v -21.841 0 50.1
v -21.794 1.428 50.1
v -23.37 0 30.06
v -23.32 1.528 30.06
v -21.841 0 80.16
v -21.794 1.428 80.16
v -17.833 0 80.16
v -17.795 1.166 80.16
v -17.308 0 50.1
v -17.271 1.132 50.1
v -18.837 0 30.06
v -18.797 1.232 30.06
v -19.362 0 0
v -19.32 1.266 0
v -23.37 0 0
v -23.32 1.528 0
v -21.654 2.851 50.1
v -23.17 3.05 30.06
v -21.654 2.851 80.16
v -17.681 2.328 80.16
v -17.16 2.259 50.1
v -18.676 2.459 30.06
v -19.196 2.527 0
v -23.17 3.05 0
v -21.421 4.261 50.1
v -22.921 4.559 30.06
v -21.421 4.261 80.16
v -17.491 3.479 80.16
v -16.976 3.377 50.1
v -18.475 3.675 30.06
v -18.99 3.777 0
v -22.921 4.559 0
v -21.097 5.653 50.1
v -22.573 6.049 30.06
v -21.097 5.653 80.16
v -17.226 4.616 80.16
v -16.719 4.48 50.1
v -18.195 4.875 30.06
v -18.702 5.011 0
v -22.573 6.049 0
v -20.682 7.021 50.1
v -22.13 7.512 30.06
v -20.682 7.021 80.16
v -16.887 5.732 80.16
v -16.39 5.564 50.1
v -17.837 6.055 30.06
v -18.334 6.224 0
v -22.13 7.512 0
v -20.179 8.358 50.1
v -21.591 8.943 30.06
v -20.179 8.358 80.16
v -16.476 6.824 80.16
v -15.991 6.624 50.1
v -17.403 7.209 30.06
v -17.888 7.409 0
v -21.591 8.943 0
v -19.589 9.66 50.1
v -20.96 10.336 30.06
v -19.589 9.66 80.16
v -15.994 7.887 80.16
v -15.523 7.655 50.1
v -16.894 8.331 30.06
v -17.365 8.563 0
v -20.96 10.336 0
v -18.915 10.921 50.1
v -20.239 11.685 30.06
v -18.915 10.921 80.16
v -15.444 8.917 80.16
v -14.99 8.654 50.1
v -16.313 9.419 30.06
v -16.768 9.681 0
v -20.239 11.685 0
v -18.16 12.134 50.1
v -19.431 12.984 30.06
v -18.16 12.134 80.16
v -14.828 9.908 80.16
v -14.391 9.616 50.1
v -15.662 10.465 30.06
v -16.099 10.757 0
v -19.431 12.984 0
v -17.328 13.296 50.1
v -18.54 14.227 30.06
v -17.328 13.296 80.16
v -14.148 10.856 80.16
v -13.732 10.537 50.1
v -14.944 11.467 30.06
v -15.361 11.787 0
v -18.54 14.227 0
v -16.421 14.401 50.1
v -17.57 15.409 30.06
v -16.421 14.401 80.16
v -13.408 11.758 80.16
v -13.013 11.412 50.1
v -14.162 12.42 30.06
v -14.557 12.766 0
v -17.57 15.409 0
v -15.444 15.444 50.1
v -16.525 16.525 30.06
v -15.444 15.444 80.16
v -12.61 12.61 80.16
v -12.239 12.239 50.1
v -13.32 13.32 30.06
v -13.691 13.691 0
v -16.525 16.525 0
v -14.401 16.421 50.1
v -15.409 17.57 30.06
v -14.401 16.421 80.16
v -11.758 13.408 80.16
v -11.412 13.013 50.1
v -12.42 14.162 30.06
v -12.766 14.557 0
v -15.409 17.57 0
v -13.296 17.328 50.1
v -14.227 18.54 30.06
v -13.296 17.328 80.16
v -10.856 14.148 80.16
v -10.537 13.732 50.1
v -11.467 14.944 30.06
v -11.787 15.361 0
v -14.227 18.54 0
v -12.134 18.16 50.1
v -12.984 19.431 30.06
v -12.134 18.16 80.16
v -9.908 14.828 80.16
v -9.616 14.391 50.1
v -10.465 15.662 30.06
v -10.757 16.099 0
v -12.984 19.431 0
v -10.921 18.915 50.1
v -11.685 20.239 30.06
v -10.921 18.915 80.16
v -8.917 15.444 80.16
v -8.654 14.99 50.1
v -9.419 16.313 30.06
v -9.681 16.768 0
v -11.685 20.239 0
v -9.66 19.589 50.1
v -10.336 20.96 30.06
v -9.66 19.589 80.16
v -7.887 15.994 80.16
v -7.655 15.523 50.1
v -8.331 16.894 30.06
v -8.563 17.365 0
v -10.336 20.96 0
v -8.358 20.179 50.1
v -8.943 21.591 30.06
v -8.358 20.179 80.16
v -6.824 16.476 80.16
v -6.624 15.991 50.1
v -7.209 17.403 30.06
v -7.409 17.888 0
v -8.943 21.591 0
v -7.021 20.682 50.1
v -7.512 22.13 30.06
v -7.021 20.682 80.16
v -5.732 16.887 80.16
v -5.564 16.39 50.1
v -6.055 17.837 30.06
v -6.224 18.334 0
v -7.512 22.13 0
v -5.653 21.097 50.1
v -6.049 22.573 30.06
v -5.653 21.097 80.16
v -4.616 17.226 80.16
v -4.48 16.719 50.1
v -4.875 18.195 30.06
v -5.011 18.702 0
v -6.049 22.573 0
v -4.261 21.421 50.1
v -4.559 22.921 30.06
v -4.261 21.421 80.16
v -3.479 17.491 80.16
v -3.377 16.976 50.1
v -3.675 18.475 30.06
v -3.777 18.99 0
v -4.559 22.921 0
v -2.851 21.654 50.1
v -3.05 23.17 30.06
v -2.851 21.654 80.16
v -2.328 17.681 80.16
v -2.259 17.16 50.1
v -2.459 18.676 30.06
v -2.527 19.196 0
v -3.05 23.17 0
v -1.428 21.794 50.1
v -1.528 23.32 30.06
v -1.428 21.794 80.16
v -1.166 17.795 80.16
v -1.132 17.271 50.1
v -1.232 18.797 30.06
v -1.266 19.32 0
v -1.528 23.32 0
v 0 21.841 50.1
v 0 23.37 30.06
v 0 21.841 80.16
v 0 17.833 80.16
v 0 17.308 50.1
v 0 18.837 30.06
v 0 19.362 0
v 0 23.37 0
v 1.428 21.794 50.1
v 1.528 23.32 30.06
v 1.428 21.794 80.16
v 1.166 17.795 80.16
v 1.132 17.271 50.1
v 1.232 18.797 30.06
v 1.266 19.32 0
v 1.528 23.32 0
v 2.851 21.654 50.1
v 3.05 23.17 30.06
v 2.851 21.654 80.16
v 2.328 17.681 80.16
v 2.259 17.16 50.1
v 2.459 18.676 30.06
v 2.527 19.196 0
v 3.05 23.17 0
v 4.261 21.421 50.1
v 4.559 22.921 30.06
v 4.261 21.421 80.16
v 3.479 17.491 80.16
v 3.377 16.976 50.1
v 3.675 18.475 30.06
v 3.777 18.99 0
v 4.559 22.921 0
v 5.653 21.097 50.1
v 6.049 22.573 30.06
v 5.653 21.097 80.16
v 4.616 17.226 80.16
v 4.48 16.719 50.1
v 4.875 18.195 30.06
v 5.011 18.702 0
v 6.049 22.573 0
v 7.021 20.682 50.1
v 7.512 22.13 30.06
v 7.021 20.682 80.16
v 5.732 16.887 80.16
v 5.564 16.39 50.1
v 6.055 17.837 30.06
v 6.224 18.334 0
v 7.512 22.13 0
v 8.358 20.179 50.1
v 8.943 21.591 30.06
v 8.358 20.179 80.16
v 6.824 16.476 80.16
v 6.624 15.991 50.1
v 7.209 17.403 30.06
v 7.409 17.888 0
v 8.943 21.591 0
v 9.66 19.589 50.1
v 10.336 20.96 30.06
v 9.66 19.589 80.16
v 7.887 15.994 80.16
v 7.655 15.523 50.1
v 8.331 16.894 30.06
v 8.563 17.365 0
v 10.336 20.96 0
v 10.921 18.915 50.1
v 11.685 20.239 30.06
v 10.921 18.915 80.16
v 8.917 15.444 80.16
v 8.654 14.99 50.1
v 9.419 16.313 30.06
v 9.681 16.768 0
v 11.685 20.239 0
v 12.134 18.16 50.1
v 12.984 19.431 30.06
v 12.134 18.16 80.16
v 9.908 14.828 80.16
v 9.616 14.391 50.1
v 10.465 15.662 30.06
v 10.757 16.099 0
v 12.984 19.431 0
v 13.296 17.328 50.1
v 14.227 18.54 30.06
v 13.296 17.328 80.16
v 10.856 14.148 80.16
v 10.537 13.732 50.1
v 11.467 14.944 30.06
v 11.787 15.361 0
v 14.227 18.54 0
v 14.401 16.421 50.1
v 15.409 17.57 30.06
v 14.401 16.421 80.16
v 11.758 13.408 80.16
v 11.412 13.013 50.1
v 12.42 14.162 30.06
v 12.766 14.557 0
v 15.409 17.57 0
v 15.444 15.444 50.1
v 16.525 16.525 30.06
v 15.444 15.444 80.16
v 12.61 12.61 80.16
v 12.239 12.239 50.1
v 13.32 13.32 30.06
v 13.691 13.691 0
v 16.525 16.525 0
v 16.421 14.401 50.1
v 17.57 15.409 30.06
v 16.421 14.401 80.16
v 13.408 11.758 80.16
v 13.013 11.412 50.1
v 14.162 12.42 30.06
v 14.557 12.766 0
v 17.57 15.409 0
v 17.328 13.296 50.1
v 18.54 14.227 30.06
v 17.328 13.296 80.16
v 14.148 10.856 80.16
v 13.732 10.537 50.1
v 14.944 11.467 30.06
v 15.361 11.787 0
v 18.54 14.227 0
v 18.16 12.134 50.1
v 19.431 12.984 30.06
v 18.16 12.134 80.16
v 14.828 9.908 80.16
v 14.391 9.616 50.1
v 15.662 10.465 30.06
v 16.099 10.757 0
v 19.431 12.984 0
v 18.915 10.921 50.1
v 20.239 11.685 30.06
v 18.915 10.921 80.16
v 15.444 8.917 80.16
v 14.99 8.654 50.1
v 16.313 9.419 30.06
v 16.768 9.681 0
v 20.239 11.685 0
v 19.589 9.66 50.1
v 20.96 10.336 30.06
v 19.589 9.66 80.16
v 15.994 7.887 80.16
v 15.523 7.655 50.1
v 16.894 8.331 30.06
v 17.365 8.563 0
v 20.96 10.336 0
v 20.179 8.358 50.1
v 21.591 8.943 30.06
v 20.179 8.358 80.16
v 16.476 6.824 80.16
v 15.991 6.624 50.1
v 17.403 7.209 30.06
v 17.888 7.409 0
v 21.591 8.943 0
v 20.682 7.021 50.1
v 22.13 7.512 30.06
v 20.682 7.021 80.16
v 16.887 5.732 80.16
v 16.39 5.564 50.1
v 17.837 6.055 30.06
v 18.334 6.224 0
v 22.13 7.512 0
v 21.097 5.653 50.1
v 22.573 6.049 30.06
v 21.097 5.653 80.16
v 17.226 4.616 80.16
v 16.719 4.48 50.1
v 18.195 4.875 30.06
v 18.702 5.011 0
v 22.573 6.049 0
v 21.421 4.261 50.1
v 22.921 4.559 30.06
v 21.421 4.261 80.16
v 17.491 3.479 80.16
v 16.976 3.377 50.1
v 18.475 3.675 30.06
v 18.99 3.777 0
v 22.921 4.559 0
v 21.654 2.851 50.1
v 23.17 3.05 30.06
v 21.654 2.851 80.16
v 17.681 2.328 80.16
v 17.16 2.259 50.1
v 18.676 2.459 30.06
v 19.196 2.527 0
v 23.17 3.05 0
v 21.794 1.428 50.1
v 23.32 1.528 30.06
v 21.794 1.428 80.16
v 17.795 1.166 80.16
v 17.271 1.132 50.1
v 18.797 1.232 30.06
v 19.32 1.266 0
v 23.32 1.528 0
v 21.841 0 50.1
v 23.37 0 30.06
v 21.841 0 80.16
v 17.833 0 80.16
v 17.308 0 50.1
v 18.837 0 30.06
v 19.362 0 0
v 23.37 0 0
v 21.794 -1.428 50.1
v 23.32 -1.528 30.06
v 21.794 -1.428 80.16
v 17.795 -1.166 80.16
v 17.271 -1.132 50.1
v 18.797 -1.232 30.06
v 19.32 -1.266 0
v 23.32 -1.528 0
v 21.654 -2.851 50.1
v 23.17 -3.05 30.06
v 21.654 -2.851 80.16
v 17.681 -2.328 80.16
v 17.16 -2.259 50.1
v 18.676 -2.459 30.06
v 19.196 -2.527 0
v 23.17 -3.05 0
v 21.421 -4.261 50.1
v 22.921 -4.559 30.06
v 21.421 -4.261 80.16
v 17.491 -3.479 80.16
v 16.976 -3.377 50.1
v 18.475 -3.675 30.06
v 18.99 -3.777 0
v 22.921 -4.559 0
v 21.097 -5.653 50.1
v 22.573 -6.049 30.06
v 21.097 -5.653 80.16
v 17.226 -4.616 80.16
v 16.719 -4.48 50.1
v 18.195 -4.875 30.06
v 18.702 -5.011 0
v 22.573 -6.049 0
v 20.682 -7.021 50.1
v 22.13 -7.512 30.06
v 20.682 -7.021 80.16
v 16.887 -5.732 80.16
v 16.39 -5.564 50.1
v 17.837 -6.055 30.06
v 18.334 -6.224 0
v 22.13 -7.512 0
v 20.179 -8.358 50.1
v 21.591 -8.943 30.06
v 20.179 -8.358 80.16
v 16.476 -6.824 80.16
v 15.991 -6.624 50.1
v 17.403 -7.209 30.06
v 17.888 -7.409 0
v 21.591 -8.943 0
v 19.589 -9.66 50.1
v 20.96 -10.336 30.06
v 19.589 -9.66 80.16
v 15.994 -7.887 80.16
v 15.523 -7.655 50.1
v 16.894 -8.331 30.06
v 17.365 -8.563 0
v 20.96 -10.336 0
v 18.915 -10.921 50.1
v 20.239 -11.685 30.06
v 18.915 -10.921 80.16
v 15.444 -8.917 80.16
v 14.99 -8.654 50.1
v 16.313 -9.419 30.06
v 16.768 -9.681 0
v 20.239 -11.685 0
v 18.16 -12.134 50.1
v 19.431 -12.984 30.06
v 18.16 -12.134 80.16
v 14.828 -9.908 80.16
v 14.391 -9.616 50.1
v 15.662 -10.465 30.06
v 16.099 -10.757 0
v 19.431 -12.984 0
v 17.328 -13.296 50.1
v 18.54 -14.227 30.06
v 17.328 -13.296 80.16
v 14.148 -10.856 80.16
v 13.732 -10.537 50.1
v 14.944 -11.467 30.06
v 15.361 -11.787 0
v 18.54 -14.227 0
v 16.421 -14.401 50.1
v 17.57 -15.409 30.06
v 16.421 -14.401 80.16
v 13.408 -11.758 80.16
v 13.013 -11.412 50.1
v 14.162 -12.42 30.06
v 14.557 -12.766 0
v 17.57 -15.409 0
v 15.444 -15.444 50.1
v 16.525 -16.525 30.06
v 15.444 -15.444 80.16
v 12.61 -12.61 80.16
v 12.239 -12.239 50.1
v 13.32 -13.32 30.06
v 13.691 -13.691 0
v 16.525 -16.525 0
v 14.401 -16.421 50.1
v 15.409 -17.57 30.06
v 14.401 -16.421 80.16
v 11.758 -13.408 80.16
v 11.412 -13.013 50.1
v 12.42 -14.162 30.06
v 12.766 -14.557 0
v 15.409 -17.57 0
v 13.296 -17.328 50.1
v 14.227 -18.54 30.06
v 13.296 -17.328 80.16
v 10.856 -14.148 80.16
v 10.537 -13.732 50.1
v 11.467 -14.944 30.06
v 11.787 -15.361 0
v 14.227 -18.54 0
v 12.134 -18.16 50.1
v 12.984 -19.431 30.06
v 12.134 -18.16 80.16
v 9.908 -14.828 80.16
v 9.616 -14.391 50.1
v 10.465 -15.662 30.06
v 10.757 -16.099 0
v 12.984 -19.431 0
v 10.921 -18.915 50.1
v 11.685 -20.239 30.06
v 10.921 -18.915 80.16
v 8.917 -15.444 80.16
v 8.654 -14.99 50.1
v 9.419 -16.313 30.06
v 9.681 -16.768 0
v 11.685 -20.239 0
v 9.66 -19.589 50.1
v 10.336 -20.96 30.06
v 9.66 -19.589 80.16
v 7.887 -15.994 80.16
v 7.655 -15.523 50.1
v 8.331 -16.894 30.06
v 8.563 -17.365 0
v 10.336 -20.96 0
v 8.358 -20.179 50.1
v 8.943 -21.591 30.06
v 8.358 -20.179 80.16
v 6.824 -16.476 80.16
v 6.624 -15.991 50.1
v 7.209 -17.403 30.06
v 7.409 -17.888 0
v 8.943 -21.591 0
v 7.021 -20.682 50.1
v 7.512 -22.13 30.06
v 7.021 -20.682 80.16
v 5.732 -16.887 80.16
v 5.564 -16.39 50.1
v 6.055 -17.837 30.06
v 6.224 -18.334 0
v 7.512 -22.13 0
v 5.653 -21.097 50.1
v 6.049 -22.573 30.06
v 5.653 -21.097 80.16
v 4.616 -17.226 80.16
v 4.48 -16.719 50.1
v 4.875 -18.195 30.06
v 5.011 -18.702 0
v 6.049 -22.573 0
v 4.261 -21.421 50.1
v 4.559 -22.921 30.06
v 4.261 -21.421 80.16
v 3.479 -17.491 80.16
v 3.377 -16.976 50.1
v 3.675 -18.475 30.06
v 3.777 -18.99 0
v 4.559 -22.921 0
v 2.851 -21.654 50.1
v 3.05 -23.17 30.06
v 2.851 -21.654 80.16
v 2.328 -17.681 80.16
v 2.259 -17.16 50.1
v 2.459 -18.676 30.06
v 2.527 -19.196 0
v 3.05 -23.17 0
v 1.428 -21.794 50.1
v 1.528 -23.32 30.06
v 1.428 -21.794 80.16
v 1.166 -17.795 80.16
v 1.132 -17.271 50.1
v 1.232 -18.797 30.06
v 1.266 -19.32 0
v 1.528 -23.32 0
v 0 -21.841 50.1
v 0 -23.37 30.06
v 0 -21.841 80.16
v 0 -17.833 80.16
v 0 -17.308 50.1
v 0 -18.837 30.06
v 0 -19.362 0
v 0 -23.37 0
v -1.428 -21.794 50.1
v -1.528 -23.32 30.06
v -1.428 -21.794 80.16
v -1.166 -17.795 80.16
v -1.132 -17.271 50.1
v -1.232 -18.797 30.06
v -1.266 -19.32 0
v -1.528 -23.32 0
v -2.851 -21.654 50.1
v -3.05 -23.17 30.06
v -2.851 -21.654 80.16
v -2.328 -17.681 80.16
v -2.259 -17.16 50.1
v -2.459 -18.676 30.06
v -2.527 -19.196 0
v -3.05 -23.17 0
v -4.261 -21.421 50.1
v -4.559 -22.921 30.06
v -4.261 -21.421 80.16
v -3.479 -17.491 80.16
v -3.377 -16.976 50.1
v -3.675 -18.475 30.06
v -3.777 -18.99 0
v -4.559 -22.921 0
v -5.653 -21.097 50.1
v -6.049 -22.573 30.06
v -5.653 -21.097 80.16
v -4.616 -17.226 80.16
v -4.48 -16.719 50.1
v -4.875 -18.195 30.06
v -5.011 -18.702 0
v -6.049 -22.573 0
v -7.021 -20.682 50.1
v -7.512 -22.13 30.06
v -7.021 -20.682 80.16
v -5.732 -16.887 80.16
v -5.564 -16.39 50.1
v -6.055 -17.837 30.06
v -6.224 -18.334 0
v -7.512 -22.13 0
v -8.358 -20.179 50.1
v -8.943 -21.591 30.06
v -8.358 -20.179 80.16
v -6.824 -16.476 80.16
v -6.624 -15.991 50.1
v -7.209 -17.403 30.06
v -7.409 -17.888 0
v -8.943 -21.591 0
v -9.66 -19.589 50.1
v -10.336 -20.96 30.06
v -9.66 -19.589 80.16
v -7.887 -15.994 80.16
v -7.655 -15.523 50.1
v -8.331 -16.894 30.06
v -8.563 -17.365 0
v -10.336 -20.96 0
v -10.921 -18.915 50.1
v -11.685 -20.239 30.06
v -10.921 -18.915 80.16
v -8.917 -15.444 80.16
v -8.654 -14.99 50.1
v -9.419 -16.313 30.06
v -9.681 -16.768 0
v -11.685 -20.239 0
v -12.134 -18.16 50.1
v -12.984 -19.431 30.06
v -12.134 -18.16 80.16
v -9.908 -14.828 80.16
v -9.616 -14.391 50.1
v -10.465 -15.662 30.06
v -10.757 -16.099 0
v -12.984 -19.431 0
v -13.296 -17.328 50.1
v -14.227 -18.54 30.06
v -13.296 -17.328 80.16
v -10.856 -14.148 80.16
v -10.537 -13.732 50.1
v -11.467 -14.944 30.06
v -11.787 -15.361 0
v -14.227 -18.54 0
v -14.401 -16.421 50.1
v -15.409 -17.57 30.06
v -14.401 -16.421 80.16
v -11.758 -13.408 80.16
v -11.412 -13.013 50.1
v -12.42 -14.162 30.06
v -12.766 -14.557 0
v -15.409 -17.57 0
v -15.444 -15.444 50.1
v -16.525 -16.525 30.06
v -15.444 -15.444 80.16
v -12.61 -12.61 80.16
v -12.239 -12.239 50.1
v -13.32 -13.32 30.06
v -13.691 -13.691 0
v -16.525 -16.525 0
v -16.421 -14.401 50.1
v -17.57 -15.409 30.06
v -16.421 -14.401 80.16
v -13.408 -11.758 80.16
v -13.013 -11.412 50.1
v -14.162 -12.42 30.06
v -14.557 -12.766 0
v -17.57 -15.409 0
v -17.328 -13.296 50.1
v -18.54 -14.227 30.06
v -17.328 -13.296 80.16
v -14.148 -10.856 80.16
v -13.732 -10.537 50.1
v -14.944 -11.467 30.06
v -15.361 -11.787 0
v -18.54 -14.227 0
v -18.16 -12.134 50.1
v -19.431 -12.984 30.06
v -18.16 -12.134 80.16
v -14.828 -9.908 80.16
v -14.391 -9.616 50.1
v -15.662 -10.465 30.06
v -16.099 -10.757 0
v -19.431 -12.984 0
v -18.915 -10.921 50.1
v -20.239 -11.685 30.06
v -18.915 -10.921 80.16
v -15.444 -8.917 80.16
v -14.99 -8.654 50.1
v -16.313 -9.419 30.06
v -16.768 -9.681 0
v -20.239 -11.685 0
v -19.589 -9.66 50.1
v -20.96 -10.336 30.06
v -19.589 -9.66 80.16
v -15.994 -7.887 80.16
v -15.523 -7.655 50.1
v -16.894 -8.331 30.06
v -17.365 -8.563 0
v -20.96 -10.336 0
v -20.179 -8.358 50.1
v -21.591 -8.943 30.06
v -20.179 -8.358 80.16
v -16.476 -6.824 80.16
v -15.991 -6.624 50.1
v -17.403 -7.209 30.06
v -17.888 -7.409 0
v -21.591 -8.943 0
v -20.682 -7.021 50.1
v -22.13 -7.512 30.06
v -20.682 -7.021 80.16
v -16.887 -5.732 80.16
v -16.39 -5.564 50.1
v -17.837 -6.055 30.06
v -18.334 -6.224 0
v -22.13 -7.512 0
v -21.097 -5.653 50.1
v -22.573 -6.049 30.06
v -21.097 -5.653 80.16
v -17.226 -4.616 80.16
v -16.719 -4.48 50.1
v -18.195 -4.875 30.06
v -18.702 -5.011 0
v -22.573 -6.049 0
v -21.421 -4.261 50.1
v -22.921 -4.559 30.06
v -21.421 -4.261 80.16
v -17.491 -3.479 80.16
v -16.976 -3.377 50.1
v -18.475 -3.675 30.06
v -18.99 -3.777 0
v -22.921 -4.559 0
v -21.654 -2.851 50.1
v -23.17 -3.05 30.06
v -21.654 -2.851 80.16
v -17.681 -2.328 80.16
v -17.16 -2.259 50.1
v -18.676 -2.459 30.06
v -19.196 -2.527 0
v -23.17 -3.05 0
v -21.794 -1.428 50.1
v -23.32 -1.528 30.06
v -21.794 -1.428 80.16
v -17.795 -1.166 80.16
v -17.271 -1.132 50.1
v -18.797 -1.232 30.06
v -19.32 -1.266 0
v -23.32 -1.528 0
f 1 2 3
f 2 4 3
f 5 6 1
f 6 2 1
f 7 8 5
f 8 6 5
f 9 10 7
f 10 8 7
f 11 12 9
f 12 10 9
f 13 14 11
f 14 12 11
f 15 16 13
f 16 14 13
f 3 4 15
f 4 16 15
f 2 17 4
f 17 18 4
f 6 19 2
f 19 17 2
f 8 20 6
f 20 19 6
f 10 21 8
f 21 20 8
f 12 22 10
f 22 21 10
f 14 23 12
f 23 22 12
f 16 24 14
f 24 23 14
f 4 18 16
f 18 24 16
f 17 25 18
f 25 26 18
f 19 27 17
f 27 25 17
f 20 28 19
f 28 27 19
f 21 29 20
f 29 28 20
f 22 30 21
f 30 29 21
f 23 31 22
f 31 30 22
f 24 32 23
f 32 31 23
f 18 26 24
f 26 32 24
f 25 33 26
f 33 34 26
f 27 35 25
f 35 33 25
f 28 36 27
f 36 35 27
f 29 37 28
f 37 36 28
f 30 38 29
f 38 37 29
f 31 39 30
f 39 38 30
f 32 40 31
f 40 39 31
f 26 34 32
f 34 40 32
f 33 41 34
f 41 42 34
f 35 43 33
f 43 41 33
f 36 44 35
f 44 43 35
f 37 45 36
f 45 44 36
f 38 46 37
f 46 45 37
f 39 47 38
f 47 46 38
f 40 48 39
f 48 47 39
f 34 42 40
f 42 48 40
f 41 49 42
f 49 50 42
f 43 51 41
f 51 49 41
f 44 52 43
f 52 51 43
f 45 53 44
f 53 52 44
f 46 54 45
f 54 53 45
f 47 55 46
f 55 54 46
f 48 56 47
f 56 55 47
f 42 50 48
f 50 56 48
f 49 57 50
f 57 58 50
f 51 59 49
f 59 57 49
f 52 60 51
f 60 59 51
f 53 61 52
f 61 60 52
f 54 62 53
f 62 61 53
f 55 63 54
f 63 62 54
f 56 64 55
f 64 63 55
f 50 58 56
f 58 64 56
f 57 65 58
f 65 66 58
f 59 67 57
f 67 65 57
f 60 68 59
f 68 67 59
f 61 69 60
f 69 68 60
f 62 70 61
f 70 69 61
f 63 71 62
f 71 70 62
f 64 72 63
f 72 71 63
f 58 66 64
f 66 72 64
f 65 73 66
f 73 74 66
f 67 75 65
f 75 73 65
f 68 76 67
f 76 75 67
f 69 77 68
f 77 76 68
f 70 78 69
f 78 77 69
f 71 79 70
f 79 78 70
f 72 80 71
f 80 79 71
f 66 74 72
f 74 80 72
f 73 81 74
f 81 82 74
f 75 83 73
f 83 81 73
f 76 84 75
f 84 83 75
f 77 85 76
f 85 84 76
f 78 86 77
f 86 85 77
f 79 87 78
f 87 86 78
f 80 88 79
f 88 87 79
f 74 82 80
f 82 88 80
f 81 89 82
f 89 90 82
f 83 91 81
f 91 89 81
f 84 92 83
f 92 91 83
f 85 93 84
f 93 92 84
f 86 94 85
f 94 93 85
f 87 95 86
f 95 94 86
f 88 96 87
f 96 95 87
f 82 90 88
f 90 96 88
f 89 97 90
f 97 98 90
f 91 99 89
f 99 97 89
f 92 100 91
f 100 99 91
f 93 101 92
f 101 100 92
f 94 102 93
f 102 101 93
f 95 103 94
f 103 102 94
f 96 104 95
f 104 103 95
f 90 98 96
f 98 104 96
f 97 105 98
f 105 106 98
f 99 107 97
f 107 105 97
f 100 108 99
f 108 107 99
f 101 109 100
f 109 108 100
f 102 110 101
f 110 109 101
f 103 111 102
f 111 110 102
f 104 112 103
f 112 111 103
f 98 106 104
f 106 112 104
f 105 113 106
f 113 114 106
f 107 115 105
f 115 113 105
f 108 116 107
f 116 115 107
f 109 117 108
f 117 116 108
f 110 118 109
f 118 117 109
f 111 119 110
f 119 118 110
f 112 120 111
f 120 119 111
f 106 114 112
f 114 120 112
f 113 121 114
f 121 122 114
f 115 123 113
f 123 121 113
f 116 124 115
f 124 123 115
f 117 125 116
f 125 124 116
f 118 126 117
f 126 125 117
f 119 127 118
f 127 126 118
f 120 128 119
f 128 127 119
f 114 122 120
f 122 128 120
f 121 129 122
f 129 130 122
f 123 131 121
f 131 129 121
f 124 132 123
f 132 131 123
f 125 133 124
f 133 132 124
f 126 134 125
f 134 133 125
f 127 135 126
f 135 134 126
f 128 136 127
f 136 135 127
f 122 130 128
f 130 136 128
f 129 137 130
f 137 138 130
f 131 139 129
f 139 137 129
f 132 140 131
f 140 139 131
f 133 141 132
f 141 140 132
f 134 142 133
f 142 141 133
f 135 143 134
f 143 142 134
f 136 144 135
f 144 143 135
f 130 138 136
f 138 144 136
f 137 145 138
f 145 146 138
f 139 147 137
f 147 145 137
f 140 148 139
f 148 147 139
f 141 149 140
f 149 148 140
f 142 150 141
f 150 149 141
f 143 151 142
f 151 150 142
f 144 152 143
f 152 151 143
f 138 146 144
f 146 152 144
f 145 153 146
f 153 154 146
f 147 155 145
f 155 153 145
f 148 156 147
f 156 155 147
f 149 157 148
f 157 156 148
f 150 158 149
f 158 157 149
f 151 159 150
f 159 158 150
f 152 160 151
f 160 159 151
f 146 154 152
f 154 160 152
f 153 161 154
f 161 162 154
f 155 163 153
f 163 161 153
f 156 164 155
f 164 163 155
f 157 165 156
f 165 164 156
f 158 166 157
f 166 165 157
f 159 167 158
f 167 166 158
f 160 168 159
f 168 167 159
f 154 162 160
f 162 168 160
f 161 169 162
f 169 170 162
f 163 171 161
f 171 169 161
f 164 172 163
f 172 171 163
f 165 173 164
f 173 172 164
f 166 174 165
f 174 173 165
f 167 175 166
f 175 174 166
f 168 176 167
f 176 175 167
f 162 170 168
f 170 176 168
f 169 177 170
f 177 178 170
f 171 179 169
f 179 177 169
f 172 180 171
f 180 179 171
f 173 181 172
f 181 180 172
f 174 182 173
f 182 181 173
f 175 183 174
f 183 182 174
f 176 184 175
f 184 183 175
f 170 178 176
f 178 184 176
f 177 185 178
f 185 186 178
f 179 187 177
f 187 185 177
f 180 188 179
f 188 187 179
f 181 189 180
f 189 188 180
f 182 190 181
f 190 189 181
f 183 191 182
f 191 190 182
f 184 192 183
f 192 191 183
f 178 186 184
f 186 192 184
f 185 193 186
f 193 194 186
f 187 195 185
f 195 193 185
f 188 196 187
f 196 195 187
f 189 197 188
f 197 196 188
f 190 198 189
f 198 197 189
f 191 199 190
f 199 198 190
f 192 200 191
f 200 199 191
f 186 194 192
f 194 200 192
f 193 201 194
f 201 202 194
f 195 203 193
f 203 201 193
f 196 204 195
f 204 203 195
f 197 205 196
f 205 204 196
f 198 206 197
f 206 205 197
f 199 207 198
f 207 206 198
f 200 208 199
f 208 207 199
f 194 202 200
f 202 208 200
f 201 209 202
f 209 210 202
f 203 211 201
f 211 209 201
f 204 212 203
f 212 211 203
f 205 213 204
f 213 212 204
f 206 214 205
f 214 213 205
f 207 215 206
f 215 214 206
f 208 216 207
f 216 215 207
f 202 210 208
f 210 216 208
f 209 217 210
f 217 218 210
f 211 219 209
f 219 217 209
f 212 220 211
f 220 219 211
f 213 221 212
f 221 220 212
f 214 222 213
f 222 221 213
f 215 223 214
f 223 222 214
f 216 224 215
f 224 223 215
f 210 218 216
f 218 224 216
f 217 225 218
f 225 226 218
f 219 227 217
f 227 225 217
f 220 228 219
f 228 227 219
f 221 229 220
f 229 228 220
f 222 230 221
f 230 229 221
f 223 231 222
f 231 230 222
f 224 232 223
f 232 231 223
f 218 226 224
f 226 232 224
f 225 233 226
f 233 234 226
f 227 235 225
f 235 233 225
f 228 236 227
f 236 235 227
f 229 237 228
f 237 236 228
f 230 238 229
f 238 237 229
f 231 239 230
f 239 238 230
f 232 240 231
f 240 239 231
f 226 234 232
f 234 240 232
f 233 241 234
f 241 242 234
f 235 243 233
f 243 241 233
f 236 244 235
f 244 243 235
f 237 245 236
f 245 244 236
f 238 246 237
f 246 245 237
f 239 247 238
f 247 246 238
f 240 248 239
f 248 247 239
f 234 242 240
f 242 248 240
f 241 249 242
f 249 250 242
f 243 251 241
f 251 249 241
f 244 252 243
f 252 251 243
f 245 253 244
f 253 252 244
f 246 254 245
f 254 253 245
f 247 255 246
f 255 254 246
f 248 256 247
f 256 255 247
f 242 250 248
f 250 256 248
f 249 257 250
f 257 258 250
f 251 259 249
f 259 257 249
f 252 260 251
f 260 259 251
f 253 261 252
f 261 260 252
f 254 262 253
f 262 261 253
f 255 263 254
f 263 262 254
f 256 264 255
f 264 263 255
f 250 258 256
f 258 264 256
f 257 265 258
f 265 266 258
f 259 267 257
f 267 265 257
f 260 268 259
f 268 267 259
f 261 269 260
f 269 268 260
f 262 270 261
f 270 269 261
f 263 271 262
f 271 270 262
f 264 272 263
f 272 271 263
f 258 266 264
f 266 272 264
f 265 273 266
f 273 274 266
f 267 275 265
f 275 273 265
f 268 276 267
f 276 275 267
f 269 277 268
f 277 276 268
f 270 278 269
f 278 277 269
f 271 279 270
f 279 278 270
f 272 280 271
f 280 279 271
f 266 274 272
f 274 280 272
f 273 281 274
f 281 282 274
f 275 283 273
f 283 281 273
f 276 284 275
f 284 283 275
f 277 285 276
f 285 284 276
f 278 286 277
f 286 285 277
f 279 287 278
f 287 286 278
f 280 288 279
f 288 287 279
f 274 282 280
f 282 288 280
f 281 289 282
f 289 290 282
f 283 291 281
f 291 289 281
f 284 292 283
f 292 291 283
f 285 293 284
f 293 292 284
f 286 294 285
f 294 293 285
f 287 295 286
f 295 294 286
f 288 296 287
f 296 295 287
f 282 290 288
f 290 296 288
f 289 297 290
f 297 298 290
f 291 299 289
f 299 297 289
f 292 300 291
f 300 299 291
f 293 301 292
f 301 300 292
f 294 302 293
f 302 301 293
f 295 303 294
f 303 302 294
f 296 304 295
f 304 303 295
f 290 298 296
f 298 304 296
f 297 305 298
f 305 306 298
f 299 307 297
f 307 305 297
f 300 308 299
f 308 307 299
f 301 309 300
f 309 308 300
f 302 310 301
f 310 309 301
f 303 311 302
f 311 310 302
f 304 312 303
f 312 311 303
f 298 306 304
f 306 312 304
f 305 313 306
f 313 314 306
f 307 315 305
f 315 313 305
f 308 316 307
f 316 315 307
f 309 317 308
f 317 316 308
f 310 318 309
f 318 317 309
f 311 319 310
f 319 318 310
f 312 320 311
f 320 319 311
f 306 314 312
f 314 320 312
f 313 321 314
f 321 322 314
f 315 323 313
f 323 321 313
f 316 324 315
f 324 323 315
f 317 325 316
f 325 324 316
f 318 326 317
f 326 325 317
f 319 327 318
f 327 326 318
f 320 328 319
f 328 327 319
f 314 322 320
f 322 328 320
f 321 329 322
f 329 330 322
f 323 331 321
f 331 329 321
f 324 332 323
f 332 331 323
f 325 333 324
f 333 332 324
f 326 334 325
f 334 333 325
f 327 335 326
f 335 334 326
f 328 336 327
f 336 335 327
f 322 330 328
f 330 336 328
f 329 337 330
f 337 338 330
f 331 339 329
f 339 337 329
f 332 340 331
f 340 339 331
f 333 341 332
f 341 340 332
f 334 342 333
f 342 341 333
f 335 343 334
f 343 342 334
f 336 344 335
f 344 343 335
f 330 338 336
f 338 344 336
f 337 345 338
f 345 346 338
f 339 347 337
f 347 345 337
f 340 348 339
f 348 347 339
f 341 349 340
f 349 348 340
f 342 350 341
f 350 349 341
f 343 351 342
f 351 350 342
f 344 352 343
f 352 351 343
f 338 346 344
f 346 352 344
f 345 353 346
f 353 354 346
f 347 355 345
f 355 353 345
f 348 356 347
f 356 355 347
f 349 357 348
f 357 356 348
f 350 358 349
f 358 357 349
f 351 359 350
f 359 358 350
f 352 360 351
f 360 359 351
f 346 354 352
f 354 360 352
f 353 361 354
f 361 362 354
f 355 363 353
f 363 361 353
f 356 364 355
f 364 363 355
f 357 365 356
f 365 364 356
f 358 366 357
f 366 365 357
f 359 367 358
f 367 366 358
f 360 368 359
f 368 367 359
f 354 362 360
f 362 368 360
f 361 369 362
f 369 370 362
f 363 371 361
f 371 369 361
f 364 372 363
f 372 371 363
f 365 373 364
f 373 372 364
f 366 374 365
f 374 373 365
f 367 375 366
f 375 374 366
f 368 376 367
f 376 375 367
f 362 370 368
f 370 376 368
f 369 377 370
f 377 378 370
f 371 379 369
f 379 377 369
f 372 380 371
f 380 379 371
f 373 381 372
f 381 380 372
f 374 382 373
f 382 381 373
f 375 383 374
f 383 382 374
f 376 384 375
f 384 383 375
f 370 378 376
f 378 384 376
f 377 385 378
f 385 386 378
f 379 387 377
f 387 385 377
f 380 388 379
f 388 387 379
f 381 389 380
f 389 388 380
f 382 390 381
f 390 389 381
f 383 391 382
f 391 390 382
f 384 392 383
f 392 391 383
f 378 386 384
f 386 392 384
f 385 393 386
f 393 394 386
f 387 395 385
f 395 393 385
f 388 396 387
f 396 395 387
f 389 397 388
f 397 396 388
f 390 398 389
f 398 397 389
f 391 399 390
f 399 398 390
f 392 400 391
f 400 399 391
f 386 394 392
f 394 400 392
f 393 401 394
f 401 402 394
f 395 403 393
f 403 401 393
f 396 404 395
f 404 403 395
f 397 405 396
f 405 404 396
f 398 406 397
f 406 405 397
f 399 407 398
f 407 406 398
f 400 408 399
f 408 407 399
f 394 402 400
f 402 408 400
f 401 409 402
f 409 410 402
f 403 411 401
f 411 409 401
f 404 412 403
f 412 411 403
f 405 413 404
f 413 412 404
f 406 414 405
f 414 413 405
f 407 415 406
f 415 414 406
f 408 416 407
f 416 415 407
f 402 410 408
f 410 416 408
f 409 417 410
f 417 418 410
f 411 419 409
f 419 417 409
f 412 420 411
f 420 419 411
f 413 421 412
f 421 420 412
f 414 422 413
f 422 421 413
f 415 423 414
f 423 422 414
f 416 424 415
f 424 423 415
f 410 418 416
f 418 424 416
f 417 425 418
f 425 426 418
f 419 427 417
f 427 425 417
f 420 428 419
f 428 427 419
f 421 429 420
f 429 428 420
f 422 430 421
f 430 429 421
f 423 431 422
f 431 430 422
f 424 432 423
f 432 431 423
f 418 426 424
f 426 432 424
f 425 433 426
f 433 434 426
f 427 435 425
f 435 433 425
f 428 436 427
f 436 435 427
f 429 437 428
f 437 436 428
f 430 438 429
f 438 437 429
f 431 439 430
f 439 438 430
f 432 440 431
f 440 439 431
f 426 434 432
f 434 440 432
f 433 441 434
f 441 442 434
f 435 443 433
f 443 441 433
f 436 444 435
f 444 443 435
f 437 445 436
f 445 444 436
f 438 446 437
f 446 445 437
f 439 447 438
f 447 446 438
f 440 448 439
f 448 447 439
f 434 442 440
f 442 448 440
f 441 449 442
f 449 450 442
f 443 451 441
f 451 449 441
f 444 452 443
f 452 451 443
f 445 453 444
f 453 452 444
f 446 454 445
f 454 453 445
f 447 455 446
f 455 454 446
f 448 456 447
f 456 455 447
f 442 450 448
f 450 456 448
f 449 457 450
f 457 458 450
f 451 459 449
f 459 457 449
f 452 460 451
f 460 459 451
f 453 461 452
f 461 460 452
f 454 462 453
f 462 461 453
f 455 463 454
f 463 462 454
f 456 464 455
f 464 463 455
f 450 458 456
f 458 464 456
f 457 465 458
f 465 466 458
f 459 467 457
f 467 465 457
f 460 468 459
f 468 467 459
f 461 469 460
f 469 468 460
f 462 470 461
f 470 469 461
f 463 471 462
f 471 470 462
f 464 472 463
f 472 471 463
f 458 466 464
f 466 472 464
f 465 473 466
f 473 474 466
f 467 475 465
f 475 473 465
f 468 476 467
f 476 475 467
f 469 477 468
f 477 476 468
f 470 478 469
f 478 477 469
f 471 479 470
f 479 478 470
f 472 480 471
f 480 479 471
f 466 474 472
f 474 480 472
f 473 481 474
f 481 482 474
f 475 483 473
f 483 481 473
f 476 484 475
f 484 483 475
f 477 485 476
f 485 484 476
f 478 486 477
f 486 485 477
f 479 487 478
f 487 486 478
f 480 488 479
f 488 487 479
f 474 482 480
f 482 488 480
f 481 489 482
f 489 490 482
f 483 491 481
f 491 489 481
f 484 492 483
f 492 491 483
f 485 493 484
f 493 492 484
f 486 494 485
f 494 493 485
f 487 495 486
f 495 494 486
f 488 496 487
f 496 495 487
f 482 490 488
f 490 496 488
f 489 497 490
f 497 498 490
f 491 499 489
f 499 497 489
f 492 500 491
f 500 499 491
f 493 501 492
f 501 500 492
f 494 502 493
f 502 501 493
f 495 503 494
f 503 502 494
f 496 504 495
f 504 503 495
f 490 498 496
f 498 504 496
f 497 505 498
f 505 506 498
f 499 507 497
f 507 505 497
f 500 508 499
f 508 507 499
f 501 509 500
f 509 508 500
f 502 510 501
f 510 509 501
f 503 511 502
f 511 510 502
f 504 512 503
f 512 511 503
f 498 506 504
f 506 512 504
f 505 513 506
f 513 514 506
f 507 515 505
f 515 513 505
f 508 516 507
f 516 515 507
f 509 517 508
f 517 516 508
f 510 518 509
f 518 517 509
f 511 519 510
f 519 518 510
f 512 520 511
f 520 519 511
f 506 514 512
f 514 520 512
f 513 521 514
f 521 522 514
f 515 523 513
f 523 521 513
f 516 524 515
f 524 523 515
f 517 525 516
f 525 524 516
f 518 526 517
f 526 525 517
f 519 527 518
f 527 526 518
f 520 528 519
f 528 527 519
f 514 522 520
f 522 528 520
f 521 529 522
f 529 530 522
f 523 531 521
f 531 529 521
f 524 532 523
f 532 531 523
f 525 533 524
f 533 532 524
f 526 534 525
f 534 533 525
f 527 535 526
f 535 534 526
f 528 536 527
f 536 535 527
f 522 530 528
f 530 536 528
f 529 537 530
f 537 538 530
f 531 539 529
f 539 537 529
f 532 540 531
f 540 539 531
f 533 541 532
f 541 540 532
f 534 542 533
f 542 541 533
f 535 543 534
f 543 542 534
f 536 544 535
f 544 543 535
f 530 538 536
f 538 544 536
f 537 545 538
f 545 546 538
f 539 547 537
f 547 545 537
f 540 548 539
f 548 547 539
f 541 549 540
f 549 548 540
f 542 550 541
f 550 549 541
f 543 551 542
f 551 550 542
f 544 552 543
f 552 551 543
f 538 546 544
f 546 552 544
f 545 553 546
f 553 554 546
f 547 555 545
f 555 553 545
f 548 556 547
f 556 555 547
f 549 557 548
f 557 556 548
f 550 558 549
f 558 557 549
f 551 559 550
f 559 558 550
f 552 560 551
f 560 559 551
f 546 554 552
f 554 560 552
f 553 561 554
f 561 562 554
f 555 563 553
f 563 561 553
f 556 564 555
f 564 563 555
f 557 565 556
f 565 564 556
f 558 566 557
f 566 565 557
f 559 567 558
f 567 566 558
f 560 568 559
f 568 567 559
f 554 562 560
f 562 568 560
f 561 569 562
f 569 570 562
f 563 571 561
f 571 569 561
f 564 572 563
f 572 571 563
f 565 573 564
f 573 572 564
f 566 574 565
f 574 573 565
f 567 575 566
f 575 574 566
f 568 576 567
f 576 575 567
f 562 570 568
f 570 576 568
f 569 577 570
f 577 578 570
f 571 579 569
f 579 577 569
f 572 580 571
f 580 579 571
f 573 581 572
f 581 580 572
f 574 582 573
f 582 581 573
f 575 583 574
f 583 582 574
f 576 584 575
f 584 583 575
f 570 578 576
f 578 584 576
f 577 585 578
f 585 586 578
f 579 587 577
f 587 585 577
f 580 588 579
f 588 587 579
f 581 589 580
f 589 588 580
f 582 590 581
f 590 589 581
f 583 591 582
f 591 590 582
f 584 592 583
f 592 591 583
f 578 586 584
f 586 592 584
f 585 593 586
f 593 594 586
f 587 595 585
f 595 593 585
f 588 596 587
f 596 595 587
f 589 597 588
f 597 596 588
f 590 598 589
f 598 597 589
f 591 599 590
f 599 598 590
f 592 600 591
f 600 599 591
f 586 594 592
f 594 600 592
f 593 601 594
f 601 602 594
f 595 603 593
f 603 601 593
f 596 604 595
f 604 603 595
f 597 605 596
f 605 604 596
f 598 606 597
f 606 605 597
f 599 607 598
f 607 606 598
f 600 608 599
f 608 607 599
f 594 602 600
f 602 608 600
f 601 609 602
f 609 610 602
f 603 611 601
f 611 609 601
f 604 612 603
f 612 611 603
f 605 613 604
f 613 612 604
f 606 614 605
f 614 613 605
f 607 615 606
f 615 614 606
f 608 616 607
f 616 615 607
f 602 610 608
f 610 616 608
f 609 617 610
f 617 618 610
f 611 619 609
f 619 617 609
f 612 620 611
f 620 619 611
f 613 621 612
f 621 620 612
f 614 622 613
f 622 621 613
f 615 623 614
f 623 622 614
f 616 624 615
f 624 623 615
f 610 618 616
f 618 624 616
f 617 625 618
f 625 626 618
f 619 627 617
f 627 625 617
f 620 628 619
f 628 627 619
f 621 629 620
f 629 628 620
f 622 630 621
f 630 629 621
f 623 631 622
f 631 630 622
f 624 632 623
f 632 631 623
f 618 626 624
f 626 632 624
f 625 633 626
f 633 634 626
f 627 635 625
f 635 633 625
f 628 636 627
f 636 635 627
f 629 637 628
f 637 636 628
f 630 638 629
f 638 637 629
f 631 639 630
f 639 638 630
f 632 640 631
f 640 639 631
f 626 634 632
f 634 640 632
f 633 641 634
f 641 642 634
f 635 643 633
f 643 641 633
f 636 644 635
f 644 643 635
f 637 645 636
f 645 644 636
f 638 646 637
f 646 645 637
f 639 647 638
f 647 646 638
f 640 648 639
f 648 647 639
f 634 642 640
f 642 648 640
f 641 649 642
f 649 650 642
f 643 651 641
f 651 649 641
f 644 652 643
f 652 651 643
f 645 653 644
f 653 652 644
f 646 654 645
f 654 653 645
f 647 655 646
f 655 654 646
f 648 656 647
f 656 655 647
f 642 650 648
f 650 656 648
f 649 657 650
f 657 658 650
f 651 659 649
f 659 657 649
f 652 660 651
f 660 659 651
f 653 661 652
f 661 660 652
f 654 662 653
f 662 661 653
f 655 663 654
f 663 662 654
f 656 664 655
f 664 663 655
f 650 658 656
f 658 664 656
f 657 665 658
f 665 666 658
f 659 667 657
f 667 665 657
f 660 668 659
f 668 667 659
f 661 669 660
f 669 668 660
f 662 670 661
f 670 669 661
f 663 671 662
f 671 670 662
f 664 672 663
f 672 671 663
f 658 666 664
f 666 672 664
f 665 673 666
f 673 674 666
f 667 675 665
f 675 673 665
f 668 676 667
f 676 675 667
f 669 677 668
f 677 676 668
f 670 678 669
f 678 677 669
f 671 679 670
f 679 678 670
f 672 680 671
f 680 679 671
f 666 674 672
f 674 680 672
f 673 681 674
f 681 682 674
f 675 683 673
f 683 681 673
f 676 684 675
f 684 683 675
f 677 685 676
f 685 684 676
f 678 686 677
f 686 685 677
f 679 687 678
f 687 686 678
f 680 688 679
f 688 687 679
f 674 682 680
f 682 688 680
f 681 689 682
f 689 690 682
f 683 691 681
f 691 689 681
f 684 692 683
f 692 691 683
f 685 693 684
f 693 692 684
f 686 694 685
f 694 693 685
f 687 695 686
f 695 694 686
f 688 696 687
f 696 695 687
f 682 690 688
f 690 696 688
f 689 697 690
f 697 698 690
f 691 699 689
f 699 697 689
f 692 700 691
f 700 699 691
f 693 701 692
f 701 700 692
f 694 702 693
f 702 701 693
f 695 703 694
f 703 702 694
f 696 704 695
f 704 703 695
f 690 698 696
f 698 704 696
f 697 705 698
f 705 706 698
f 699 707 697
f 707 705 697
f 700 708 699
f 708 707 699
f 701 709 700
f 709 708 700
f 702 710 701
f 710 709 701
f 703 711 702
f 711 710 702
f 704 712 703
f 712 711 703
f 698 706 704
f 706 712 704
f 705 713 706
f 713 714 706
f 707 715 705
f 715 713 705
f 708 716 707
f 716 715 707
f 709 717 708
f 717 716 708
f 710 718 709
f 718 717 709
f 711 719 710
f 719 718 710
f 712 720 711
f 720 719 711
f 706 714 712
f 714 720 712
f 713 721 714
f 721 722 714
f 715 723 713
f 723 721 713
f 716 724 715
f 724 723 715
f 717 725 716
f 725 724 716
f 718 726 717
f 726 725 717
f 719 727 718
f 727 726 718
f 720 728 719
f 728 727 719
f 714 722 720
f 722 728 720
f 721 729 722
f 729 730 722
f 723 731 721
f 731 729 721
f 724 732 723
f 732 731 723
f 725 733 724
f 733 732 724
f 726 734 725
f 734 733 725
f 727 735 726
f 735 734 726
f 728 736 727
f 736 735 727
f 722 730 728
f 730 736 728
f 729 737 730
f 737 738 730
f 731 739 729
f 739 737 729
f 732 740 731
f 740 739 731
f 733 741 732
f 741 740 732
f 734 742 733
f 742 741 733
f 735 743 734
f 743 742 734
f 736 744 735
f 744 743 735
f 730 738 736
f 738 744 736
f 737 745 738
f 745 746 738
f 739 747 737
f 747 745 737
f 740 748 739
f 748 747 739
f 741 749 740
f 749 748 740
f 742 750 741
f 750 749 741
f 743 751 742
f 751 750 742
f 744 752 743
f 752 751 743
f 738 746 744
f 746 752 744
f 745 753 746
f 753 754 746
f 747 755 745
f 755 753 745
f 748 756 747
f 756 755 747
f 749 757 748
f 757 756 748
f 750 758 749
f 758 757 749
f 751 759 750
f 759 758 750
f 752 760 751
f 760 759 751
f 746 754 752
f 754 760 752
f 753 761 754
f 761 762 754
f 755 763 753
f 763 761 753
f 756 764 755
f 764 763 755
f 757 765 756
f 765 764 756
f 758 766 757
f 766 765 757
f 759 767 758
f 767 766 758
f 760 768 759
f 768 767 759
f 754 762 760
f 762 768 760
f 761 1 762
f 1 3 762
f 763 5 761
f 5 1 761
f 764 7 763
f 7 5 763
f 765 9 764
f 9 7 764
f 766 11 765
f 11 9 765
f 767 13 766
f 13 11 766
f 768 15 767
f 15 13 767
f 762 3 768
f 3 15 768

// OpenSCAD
//------------------------------------------------------------------
/*

Adapters for connecting a tool to a dust collector.

The adapter fits around the outside diameter of the pipes on the
tool and the vaccuum. Measure the diameter of the pipes with a set
of calipers. Enter the values and the script will take care of
the rest.

*/
//------------------------------------------------------------------
// Parameters:

// outside diameter of pipe 1 (mm)
od_pipe_1 = 38.0;
// adapter length for pipe 1 (mm)
len_pipe_1 = 30;
// outside diameter of pipe 1 (mm)
od_pipe_2 = 35.0;
// adapter length for pipe 2 (mm)
len_pipe_2 = 30;
// transition length (mm)
transition_length = 20;
// wall thickness (mm)
wall_thickness = 4;
// The adapter ID will be larger than the pipe OD by this factor
clearance = 1.017;
// internal taper (degrees)
taper = 1;

//------------------------------------------------------------------
// Set the scaling value to compensate for print shrinkage

//scale = 1 / 0.995; // ABS ~0.5% shrinkage
scale = 1 / 0.998; // PLA ~0.2% shrinkage

function dim(x) = scale * x;

//------------------------------------------------------------------
// derived values

r1 = dim(od_pipe_1) / 2;
r2 = dim(od_pipe_2) / 2;

len1 = dim(len_pipe_1);
len2 = dim(len_pipe_2);

tlen = dim(transition_length);

wt = dim(wall_thickness);

//------------------------------------------------------------------
// control the number of facets on cylinders

facet_epsilon = 0.01;
function facets(r) = 180 / acos(1 - (facet_epsilon / r));

//------------------------------------------------------------------
// generate a 2D polygon for the adapter wall

module adapter_wall()
{

    ir1 = r1 * clearance;
    ir2 = r2 * clearance;
    or1 = ir1 + wt;
    or2 = ir2 + wt;
    t1 = len1 * tan(taper);
    t2 = len2 * tan(taper);

    echo("nominal od1 is ", or1 * 2, "mm");
    echo("nominal od2 is ", or2 * 2, "mm");

    points = [
        [ ir1, 0 ],
        [ or1, 0 ],
        [ or1, len1 ],
        [ or2, len1 + tlen ],
        [ or2, len1 + tlen + len2 ],
        [ ir2, len1 + tlen + len2 ],
        [ ir2 - t2, len1 + tlen ],
        [ ir1 - t1, len1 ],
    ];
    polygon(points = points, convexity = 2);
}

//------------------------------------------------------------------

module adapter()
{
    overhang_angle = atan2(abs(r2 - r1), transition_length);
    echo("overhang angle is ", overhang_angle, "degrees");
    rotate_extrude(angle = 360, $fn = facets(r1))
    {
        adapter_wall();
    }
}

adapter();

//------------------------------------------------------------------
